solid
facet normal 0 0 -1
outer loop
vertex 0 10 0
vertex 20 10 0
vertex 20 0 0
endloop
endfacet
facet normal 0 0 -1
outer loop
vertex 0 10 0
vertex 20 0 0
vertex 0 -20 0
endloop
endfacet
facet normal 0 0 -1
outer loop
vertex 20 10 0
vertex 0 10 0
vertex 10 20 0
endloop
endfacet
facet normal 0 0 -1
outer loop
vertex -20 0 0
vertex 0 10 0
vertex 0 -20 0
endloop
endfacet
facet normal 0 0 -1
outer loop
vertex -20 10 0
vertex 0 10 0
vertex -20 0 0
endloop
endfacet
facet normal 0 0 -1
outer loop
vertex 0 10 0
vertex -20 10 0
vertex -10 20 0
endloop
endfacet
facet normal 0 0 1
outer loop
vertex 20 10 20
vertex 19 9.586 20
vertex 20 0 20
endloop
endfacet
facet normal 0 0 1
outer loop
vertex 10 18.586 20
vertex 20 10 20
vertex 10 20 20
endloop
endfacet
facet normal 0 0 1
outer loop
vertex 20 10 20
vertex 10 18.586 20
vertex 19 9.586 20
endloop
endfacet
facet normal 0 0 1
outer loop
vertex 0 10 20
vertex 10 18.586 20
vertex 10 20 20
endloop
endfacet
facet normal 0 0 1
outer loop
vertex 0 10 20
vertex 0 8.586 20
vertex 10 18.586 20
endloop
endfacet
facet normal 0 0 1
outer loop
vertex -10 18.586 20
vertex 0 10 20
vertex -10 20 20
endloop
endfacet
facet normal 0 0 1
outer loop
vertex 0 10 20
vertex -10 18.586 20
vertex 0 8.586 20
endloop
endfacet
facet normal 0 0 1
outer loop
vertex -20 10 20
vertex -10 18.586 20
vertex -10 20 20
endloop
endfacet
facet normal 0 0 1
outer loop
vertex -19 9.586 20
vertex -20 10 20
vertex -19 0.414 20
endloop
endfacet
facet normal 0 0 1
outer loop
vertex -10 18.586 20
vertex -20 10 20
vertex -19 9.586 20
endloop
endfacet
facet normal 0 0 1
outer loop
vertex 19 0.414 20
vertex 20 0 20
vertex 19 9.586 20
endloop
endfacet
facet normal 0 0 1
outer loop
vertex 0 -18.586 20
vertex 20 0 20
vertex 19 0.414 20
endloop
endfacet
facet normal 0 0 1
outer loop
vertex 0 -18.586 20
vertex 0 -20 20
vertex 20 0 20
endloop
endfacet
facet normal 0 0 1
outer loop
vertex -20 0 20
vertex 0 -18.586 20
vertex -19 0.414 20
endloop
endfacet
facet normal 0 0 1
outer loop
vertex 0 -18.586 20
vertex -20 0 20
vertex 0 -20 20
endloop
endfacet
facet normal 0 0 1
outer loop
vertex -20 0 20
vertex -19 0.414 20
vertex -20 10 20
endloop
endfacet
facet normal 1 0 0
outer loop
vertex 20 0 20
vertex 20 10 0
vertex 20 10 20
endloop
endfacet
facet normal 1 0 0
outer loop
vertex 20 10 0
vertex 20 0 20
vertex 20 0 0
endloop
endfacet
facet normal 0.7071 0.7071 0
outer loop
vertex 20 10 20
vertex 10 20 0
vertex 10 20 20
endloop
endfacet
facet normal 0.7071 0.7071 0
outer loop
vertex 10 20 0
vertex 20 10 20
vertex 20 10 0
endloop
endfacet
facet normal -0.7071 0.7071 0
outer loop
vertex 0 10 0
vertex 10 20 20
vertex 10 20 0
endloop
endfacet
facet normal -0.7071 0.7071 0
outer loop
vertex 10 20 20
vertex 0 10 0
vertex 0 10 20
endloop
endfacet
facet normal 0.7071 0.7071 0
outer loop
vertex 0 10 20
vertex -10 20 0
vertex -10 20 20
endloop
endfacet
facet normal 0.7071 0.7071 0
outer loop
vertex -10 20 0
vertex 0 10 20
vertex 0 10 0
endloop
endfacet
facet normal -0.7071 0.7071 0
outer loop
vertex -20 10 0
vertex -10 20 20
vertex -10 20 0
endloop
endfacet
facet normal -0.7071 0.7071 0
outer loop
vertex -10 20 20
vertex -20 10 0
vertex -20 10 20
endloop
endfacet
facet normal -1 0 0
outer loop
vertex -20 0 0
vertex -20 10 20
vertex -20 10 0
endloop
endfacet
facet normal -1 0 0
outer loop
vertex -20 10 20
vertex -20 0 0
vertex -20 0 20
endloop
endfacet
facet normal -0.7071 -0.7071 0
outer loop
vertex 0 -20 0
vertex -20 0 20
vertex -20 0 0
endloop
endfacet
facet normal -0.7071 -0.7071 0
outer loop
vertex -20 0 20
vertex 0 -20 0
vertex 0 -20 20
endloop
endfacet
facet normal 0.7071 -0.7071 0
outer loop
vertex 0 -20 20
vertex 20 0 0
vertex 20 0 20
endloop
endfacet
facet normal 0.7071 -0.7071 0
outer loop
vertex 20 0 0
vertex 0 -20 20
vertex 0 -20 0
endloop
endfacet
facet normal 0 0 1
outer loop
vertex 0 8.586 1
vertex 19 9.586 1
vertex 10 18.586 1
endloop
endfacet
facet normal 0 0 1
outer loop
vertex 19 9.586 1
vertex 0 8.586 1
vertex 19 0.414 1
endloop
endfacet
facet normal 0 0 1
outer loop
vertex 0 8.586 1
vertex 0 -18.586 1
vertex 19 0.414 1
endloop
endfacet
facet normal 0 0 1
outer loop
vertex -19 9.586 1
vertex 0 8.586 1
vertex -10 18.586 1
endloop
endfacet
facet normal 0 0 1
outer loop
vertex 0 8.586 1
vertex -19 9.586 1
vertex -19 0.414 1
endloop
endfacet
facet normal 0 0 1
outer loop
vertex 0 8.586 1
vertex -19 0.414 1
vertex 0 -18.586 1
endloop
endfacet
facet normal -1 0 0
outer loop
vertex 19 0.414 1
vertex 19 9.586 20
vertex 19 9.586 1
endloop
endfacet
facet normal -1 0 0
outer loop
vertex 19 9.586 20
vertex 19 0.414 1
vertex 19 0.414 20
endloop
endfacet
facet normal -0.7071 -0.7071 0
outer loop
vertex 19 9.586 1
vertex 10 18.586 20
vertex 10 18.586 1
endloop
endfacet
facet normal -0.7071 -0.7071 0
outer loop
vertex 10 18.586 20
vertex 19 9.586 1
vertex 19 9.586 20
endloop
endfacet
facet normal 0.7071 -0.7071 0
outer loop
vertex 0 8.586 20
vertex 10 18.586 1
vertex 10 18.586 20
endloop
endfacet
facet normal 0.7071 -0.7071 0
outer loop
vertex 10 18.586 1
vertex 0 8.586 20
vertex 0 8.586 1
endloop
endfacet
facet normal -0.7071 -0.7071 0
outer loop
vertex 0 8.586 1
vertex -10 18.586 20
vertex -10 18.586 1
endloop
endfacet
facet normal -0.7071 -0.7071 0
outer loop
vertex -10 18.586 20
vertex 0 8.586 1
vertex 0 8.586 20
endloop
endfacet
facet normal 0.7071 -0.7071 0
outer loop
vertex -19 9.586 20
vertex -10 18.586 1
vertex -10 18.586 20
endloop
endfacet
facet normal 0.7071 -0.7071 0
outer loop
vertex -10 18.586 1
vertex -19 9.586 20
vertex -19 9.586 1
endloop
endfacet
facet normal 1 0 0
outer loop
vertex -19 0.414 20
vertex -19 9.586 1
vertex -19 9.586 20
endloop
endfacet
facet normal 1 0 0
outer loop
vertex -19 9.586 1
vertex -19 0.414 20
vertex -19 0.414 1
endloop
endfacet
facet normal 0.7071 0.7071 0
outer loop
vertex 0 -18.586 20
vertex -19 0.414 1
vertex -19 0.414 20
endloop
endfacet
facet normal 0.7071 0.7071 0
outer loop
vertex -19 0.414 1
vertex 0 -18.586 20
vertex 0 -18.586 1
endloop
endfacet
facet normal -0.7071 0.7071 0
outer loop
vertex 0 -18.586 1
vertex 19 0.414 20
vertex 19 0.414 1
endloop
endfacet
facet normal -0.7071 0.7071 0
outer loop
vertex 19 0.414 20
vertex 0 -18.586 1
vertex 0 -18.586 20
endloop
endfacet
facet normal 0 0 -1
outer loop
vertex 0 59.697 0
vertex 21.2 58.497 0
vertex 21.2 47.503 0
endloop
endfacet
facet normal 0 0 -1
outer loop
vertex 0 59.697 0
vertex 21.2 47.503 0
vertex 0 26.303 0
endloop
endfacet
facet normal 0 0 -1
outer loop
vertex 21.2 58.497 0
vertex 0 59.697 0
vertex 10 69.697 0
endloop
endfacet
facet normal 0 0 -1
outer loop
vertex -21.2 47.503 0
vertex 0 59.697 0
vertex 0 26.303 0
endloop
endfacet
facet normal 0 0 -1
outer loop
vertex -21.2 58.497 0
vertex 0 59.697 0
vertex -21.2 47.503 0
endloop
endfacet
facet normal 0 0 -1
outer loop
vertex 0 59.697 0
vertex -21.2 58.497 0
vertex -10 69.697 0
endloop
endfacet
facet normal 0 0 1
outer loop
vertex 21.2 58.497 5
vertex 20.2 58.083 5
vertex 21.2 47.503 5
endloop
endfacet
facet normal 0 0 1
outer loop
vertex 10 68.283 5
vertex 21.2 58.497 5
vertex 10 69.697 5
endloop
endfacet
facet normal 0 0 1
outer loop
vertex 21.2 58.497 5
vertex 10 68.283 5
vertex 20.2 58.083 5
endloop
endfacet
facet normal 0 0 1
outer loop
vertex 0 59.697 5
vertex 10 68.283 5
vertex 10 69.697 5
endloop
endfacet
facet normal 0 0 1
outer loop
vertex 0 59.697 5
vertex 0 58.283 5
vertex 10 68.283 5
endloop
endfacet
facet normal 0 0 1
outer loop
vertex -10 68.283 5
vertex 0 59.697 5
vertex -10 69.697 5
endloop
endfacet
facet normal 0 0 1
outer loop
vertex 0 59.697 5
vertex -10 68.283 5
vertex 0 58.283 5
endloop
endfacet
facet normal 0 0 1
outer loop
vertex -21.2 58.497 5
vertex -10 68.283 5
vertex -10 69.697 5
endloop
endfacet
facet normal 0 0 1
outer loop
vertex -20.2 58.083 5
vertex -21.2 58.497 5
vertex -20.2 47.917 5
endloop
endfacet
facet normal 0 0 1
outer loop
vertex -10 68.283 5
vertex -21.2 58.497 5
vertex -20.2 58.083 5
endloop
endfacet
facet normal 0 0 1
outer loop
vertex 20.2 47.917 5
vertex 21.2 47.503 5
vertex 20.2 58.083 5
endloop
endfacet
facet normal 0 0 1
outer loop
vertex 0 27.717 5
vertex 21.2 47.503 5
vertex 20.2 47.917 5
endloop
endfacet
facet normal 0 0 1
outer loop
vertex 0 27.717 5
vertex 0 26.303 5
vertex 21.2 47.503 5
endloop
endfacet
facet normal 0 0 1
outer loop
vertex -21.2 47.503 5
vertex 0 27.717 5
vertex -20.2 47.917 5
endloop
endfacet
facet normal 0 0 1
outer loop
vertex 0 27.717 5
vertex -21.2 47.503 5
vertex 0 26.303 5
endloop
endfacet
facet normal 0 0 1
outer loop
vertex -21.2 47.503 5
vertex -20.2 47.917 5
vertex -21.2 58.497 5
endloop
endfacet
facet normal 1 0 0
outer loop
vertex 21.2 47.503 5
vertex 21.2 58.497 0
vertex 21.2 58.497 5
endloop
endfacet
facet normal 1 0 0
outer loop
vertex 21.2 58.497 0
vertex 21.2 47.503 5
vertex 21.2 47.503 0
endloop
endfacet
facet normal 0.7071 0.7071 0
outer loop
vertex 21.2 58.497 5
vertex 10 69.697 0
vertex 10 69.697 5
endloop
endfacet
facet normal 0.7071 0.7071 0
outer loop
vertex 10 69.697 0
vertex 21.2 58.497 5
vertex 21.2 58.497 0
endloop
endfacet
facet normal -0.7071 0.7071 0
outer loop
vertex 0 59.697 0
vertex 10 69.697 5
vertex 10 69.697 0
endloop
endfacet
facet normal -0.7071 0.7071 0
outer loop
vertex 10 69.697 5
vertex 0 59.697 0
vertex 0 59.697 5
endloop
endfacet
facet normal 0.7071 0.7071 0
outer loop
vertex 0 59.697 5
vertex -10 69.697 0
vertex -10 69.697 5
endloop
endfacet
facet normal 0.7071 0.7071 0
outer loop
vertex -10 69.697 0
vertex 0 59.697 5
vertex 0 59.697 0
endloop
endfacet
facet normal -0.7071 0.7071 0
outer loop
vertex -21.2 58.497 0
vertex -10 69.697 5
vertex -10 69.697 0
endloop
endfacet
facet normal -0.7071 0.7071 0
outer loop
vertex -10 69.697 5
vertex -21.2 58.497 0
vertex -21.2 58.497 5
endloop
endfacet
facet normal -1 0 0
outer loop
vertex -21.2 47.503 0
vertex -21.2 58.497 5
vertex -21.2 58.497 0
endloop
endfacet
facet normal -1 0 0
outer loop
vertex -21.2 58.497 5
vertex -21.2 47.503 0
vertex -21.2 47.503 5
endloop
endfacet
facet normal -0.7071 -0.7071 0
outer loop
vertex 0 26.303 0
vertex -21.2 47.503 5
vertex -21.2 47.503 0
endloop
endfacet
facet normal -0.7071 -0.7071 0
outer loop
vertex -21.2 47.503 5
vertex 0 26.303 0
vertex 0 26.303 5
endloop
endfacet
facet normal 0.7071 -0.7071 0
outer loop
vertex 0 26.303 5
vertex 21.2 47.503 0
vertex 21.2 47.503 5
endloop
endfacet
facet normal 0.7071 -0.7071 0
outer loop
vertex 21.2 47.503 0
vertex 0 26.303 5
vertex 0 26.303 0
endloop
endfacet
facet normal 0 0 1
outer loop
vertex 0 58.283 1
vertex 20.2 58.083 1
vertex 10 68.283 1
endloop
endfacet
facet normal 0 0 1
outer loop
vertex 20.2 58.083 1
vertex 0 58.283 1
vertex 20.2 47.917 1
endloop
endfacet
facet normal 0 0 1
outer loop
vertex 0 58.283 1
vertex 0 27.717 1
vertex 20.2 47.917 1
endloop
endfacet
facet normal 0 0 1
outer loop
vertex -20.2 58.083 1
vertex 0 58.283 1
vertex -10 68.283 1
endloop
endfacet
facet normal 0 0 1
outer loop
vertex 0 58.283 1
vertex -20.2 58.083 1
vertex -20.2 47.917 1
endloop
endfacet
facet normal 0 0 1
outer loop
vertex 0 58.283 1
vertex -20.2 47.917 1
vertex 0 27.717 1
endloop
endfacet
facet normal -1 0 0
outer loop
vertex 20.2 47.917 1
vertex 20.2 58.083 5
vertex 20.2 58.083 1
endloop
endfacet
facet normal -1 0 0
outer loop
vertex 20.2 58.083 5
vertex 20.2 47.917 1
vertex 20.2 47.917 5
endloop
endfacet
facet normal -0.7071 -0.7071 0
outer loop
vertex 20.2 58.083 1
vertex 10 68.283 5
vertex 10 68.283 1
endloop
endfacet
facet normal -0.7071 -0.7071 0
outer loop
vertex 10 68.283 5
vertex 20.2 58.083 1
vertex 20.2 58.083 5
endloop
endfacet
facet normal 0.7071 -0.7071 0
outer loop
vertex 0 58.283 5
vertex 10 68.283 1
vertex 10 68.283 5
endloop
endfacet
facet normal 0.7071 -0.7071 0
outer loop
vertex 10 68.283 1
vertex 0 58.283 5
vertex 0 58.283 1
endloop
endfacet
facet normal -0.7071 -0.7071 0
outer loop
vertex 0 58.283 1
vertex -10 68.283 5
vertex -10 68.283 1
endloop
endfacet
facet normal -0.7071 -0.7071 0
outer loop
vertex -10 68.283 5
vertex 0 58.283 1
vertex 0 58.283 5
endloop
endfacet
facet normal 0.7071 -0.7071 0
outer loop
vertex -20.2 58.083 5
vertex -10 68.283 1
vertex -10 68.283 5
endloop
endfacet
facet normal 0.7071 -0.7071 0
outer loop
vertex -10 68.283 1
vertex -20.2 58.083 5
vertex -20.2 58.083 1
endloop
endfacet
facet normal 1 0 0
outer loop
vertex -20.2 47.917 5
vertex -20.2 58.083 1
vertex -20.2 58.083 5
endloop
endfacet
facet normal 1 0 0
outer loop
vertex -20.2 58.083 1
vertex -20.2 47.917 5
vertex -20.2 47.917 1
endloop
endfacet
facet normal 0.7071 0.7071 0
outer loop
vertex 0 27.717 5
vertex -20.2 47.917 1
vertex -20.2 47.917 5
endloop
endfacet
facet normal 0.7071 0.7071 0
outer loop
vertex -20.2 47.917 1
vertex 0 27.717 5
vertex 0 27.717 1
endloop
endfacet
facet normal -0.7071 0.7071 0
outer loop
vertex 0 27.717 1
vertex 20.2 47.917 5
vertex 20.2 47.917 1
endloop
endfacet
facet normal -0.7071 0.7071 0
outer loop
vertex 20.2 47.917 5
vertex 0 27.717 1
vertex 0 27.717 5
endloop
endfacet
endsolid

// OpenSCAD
//[Parametric Heart Box v.1]
//Written by Hermes Alvarado
//<hermesalvarado@gmail.com>

//Definitions:
size = 40; //total width and length of box
height = 20; //total height of box
thickness = 1; //wall thickness
bottomthickness = 1;
lidheight = 5;
tolerance = 0.2; //tolerance between box and lid


//Calculations
module heart(){
    polygon([[0,-size/2],[size/2,0],[size/2,size/4],[size/4,size/2],[0,size/4],[-size/4,size/2],[-size/2,size/4],[-size/2,0]],[[0,1,2,3,4,5,6,7]],10);
};
module innerheart(){
    offset(delta=-thickness){
        polygon([[0,-size/2],[size/2,0],[size/2,size/4],[size/4,size/2],[0,size/4],[-size/4,size/2],[-size/2,size/4],[-size/2,0]],[[0,1,2,3,4,5,6,7]],10);
    }
};
module heartbox(){
    difference(){
        linear_extrude(height=height,center=false,convexity=10,twist=0){
            heart();
        }
        translate([0,0,bottomthickness]){
            linear_extrude(height=height-bottomthickness,center=false,convexity=10,twist=0){
                innerheart();
            }
        }
    }
};
module heartboxlid(){
    translate([0,size*1.2,0]){
        difference(){
            linear_extrude(height=lidheight,center=false,convexity=10,twist=0){
                offset(delta=thickness+tolerance){
                    heart();
                }
            }
            translate([0,0,bottomthickness]){
            linear_extrude(height=lidheight-bottomthickness,center=false,convexity=10,twist=0){
                offset(delta=thickness+tolerance){
                    innerheart();
                }
            }
        }
        }
    }
};
heartbox();
heartboxlid();
